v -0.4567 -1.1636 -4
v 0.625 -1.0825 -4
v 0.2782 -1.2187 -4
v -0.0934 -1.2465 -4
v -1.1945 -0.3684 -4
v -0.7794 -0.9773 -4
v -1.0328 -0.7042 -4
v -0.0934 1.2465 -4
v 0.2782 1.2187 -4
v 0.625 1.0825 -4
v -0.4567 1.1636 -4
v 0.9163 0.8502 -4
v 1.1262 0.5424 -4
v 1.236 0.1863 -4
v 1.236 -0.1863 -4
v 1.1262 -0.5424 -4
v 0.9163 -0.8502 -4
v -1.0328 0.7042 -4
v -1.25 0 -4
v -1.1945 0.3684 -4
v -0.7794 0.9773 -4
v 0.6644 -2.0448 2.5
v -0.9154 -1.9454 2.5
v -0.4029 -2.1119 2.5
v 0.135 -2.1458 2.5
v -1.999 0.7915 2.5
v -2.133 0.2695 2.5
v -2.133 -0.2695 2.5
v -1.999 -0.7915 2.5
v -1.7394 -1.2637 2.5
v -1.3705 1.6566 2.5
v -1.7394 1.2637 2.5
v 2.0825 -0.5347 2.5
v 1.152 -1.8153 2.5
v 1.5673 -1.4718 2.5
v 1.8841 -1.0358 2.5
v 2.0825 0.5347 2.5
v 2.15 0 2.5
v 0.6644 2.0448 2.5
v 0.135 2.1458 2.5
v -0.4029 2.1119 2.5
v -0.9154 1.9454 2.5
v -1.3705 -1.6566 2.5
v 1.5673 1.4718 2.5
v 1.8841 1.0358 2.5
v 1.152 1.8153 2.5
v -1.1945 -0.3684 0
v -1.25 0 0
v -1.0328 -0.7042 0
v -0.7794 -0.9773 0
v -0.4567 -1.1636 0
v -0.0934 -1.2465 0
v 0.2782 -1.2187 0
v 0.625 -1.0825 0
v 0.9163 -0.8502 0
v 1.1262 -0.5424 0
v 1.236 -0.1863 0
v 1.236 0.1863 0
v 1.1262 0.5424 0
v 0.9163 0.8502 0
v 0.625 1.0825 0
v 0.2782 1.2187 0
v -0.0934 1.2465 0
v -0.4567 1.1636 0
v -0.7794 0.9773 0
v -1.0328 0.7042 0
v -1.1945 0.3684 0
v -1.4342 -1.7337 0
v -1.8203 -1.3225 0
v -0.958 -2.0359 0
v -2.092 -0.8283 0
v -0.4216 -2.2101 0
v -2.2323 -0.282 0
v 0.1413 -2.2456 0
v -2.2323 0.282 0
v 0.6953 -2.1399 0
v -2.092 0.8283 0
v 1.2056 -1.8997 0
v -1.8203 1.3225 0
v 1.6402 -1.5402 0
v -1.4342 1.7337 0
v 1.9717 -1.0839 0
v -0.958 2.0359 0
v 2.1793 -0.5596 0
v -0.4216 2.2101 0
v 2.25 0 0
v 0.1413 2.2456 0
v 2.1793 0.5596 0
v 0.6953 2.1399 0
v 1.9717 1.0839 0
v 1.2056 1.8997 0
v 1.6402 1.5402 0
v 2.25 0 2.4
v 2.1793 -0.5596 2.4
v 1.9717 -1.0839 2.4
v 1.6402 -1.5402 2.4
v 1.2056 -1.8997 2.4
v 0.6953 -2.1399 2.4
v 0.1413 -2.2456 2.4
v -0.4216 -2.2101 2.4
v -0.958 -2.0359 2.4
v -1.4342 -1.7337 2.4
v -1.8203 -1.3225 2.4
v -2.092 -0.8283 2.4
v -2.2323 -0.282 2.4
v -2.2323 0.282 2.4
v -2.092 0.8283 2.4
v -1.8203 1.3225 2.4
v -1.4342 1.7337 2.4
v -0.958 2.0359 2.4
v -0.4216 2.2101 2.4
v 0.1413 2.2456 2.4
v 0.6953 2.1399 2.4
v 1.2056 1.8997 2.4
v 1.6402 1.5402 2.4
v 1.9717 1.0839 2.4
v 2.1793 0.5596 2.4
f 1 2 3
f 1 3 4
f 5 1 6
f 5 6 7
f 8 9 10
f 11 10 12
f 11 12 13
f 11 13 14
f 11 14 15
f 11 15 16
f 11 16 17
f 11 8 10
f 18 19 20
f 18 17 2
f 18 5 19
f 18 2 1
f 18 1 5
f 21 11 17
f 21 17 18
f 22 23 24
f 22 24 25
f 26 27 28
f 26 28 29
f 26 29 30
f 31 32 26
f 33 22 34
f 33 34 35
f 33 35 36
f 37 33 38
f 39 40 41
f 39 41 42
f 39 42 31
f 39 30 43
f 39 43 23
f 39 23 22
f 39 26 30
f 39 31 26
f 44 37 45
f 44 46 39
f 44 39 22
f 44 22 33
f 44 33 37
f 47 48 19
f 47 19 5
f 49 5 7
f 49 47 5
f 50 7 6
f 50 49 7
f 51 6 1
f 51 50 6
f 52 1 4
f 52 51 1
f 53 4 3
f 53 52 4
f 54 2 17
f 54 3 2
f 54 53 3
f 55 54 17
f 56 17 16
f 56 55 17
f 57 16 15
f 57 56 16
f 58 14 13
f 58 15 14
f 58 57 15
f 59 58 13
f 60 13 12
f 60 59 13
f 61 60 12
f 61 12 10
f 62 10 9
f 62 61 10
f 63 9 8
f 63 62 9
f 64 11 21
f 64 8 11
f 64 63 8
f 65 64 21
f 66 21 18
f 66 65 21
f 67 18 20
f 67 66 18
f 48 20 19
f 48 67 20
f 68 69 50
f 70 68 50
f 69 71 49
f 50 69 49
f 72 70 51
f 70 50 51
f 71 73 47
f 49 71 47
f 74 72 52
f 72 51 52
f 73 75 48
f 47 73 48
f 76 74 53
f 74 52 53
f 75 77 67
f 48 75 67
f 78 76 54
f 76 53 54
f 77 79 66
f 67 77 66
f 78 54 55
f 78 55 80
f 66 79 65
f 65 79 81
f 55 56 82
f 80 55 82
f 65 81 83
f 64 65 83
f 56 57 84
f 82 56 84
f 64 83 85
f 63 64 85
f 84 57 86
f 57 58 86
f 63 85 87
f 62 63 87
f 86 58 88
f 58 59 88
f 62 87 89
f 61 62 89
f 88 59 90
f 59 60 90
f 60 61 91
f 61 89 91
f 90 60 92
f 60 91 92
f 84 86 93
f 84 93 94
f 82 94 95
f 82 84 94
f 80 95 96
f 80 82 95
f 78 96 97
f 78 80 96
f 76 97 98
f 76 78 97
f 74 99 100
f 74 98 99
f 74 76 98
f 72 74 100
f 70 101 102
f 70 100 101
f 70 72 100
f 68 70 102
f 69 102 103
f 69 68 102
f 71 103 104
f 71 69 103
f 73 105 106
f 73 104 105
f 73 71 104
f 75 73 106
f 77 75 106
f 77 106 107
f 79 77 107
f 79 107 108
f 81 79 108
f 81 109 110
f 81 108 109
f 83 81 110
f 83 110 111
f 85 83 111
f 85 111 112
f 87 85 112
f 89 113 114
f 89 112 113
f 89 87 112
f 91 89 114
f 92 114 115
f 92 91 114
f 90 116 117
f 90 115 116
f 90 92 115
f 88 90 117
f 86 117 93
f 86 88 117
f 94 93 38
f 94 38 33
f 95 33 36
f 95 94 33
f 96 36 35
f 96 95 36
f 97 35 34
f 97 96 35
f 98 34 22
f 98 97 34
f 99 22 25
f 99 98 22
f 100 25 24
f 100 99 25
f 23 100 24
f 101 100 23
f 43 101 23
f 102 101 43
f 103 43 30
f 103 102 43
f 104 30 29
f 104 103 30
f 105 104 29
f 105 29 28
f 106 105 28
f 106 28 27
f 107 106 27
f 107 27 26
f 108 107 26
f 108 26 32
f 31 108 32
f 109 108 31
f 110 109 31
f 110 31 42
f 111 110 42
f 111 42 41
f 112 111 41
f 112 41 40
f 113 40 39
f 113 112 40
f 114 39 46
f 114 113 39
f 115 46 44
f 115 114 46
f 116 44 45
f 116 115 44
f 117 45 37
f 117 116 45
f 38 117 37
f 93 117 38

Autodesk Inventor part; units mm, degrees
ref_plane "YZ Plane" through (0, 0, 0) normal (1, 0, 0) x (0, 1, 0)
ref_plane "XZ Plane" through (0, 0, 0) normal (0, 1, 0) x (-1, 0, 0)
ref_plane "XY Plane" through (0, 0, 0) normal (0, 0, 1) x (1, 0, 0)
sketch "スケッチ1" plane through (0, 0, 0) normal (0, 0, 1) x (1, 0, 0)
  circle A0 centre (0, 0) radius 2.25
  dimension "d0" = 4.5
extrude "押し出し1" add sketch "スケッチ1" along normal blind 2.5
sketch "スケッチ2" plane through (0, 0, 0) normal (0, 0, -1) x (-1, 0, 0)
  circle A0 centre (0, 0) radius 1.25
  dimension "d3" = 2.5
extrude "押し出し2" add sketch "スケッチ2" along normal blind 4
chamfer "面取り1" distance 0.1 angle 45 1 edges at (-2.25, 0, 2.5)
thread "ねじ1" size "M2.5x0.45" class "6g" standard "ANSI Metric M Profile" full length
properties part number "M2.5×4" material "ステンレス鋼"
